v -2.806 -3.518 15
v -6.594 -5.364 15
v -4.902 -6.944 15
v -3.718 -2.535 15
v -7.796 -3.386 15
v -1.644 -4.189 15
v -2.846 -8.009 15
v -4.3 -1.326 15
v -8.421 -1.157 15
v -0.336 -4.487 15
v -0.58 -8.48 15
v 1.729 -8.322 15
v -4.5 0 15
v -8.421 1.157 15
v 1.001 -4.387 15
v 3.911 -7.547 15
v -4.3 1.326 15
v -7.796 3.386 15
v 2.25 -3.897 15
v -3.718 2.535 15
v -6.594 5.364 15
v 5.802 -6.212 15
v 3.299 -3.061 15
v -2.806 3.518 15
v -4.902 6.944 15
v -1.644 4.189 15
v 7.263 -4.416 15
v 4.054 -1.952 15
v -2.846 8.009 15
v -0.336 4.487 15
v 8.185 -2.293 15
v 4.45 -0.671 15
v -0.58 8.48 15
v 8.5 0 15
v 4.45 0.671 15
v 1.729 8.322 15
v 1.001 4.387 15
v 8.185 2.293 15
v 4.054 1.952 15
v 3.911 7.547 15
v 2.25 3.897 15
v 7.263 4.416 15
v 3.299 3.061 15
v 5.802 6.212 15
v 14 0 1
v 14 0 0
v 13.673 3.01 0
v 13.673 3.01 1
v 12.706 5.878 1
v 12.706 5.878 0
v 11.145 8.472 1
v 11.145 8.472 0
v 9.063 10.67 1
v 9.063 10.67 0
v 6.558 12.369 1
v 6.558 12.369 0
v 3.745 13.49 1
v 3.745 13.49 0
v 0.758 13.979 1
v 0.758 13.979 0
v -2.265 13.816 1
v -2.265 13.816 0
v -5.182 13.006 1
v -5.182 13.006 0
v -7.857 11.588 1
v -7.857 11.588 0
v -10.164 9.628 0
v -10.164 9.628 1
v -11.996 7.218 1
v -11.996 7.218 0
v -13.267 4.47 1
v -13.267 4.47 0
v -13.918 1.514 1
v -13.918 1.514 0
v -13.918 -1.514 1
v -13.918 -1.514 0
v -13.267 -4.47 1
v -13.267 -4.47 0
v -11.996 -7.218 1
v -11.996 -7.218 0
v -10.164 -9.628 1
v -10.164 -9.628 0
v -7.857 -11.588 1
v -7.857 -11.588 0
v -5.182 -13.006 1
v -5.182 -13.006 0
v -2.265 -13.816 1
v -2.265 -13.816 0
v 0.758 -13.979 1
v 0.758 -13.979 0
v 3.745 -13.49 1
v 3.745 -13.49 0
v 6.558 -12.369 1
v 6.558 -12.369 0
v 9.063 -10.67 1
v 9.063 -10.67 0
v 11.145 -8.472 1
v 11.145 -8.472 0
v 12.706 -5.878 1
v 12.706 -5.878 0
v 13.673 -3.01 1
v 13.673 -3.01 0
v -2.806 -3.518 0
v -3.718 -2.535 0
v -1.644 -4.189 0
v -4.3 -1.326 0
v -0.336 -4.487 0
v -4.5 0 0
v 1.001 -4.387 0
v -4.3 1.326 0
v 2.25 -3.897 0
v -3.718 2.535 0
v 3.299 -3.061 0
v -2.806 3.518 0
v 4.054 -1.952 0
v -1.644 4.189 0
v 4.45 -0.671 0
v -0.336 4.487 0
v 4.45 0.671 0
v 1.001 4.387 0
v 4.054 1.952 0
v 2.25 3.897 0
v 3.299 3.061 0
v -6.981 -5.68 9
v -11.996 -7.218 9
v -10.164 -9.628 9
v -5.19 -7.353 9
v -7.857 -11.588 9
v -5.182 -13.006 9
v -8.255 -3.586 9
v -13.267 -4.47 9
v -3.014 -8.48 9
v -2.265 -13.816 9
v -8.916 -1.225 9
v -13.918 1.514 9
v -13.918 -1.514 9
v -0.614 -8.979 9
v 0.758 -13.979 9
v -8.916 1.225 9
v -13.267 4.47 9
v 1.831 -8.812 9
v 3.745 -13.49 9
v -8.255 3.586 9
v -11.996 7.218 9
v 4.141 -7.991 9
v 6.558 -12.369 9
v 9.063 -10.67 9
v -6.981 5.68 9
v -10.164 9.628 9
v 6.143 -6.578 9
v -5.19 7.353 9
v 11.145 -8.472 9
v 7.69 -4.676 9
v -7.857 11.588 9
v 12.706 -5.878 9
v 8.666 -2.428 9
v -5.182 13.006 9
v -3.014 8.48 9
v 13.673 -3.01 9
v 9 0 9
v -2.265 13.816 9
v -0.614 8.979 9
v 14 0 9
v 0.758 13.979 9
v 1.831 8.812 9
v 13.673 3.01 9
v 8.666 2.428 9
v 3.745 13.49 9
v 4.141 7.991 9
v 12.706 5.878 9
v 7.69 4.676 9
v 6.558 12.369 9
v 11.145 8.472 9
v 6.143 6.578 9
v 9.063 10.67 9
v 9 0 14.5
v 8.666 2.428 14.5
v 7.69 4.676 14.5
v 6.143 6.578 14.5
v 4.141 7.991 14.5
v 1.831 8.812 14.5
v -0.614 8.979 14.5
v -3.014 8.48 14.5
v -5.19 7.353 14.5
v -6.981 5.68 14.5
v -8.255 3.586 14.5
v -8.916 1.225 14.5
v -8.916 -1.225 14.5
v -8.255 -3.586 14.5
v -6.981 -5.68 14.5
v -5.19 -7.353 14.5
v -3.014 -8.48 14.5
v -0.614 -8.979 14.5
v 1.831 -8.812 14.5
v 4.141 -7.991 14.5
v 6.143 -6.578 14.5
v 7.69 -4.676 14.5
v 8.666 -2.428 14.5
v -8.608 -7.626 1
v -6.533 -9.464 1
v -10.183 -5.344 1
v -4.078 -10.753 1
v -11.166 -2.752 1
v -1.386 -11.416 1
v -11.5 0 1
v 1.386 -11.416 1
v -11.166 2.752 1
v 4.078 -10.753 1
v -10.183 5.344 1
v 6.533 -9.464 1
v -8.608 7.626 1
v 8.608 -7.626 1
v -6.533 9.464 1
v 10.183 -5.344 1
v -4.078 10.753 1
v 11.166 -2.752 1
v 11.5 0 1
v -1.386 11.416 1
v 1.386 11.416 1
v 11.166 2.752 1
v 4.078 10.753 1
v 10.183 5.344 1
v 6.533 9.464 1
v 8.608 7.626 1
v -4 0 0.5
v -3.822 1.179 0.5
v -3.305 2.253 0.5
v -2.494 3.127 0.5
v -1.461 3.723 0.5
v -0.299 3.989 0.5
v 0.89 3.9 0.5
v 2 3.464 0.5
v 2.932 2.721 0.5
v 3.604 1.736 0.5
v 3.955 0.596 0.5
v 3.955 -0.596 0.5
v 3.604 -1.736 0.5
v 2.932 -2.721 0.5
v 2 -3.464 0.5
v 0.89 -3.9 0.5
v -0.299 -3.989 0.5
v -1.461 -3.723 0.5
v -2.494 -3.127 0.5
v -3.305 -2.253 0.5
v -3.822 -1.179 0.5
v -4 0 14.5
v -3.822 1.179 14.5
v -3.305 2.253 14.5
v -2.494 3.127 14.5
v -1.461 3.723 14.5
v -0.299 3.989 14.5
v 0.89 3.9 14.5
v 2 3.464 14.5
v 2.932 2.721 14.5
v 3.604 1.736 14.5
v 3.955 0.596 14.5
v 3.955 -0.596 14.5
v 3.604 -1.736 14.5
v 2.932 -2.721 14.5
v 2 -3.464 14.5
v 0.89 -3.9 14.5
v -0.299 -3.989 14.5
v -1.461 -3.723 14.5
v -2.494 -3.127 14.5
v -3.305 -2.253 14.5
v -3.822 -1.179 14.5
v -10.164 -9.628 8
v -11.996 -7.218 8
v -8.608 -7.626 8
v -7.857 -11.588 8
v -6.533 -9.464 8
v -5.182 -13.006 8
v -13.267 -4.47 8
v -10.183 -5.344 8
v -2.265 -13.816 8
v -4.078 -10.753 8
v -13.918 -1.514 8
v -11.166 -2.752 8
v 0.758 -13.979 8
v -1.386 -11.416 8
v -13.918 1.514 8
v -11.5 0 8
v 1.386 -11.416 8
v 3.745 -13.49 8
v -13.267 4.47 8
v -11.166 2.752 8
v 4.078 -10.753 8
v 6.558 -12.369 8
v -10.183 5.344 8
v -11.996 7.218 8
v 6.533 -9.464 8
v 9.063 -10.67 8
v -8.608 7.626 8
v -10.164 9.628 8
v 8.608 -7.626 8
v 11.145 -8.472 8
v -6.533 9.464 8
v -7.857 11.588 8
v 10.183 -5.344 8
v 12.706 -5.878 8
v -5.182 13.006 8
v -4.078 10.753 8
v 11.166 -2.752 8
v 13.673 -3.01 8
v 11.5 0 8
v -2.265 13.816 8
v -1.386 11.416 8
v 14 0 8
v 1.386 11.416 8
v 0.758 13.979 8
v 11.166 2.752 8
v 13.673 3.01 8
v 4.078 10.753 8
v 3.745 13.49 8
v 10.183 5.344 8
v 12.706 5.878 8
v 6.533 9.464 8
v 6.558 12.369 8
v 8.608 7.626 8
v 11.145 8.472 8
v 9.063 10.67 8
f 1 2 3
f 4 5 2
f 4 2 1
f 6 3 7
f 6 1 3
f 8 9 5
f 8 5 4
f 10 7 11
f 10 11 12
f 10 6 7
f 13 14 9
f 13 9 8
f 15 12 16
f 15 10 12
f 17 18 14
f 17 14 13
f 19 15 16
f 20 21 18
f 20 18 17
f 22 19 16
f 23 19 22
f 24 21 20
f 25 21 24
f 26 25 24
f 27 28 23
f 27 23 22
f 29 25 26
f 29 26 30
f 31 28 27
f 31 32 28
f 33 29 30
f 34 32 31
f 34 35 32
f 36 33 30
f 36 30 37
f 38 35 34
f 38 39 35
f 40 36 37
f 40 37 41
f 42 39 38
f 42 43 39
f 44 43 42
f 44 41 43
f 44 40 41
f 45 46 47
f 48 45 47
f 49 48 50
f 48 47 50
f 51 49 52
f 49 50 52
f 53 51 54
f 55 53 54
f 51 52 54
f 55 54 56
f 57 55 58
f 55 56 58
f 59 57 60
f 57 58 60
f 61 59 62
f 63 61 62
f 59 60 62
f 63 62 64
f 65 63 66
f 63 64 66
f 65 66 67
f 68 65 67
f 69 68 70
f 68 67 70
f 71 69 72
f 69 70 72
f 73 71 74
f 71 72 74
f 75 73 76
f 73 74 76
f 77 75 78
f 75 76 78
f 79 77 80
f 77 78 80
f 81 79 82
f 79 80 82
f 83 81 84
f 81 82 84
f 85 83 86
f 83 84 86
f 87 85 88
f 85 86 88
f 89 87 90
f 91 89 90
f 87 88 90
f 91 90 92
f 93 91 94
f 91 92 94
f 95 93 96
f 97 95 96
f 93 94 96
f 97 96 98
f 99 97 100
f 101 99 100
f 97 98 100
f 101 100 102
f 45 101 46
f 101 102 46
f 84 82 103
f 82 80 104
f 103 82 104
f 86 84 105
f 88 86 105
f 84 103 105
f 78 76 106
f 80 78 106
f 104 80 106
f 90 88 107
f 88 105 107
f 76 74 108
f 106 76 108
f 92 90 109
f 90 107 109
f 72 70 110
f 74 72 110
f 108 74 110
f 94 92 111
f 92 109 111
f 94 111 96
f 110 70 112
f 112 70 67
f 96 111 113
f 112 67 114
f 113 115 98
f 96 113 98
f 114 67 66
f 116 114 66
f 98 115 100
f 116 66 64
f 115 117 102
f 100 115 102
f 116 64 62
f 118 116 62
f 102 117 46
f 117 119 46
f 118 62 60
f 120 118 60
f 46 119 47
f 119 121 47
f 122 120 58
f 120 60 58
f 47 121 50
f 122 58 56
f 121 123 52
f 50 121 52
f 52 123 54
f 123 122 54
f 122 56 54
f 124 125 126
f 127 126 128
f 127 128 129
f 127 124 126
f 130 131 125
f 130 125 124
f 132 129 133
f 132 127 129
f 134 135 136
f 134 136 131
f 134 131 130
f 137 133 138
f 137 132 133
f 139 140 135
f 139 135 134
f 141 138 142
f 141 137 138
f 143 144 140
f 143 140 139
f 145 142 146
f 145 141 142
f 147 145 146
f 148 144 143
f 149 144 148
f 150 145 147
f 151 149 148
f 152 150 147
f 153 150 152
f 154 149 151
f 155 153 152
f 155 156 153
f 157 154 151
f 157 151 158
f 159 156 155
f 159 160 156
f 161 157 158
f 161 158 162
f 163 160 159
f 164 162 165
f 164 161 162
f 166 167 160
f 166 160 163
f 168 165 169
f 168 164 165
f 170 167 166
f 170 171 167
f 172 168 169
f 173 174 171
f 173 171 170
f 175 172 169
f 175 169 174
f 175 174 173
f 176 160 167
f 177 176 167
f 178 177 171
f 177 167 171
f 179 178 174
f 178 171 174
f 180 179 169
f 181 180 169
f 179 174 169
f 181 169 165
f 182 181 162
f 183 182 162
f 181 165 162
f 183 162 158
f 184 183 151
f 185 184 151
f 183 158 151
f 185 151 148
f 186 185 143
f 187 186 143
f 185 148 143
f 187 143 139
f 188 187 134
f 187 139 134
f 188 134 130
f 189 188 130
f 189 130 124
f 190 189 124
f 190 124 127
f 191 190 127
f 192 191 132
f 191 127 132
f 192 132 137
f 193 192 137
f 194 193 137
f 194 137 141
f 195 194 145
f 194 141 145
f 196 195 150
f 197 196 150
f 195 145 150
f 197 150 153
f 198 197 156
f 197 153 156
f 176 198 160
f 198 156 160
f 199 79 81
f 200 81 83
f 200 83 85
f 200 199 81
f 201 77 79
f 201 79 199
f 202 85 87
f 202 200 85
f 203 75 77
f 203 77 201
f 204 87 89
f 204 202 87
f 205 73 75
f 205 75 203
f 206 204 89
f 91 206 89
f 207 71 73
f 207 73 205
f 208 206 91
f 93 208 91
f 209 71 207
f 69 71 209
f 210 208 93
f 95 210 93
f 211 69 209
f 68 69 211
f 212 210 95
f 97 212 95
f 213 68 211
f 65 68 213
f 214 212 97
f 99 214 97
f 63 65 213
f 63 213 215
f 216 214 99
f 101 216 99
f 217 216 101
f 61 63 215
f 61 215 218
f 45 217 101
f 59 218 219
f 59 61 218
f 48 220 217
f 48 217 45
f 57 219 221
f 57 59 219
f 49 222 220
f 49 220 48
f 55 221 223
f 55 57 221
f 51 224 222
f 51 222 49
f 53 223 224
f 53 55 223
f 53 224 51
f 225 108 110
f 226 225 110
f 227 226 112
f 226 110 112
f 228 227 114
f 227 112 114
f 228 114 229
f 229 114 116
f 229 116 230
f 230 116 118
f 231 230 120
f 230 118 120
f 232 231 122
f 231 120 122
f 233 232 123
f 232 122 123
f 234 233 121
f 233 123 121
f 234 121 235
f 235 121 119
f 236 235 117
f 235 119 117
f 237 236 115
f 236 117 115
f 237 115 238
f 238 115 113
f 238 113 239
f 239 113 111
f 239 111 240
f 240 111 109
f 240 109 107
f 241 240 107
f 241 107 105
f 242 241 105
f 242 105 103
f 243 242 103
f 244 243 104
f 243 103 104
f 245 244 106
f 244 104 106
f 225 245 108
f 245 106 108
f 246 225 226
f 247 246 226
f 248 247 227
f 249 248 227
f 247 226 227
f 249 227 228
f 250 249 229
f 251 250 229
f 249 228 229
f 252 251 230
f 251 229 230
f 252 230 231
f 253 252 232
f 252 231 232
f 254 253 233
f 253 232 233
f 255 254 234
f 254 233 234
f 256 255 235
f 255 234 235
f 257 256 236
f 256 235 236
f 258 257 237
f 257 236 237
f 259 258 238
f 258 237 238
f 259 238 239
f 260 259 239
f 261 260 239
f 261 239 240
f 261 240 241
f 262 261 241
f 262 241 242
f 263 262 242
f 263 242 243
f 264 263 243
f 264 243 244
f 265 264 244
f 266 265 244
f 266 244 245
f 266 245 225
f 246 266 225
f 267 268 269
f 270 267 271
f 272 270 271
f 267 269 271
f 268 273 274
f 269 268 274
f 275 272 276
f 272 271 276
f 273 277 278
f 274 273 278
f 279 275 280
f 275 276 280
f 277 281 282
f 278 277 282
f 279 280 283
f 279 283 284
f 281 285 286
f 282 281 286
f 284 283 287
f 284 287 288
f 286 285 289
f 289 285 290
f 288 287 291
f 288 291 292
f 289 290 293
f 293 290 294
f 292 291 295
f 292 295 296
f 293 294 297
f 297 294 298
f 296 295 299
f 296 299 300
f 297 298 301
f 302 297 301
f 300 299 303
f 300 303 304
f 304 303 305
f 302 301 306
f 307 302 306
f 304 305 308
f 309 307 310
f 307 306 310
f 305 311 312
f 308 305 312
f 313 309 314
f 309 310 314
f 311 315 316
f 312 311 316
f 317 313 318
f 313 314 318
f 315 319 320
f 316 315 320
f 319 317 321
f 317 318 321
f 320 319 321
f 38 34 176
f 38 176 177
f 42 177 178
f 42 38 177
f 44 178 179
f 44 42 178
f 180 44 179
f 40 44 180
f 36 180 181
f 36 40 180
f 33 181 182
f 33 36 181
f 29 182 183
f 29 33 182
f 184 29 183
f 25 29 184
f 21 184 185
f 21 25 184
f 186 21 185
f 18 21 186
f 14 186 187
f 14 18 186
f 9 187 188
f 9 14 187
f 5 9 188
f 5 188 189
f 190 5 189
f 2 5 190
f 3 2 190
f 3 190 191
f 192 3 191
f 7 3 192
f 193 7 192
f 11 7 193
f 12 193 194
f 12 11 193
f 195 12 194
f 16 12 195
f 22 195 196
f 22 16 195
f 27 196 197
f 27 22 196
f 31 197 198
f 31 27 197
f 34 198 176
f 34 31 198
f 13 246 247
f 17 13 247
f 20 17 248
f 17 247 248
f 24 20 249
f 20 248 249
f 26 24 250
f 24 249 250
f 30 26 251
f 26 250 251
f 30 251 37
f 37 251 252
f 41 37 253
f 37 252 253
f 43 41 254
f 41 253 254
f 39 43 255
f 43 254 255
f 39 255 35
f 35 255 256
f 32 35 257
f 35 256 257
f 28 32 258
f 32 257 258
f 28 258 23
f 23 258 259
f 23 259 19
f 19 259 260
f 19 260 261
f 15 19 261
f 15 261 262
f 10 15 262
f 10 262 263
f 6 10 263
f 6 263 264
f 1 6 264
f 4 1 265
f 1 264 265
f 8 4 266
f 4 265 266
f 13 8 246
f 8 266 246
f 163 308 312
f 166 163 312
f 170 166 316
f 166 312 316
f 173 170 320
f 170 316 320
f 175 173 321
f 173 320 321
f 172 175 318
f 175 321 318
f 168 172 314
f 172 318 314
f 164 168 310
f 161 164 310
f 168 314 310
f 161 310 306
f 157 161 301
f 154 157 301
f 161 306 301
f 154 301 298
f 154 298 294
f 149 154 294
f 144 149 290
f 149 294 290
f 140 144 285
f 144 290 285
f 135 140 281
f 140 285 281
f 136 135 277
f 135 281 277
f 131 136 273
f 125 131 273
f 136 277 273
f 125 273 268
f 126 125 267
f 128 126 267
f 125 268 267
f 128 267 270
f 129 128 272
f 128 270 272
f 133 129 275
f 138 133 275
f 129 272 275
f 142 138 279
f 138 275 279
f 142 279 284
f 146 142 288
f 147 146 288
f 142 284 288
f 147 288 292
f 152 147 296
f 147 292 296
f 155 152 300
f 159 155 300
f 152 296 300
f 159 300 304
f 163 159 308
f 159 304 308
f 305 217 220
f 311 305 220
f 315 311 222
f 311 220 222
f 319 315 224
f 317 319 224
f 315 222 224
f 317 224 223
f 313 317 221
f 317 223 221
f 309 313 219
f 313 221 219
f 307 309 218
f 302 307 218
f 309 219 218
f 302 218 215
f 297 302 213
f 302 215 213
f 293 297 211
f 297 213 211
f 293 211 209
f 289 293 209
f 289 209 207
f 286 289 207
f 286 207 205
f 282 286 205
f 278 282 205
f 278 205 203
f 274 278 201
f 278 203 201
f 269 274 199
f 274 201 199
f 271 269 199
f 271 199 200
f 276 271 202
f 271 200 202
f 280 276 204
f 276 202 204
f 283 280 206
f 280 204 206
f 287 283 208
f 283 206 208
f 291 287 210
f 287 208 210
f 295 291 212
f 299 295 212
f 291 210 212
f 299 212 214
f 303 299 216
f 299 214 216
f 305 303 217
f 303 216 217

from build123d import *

# Parameters (mm, degrees)
SKETCH1_R           = 14
BOSS_EXTRUDE1_DEPTH = 1
SKETCH2_R           = 11.5
BOSS_EXTRUDE2_DEPTH = 7
SKETCH3_R           = 14
BOSS_EXTRUDE3_DEPTH = 1
SKETCH4_R           = 9
BOSS_EXTRUDE4_DEPTH = 6
SKETCH5_R           = 4
CUT_EXTRUDE1_DEPTH  = 23
CHAMFER1_SIZE       = 0.5


with BuildPart() as part:
    # Sketch1 → Boss-Extrude1 (new body)
    with BuildSketch(Plane.XY):
        Circle(SKETCH1_R)
    extrude(amount=BOSS_EXTRUDE1_DEPTH)

    # Sketch2 → Boss-Extrude2 (add)
    with BuildSketch(Plane.XY.offset(1)):
        Circle(SKETCH2_R)
    extrude(amount=BOSS_EXTRUDE2_DEPTH)

    # Sketch3 → Boss-Extrude3 (add)
    with BuildSketch(Plane.XY.offset(8)):
        Circle(SKETCH3_R)
    extrude(amount=BOSS_EXTRUDE3_DEPTH)

    # Sketch4 → Boss-Extrude4 (add)
    with BuildSketch(Plane.XY.offset(9)):
        Circle(SKETCH4_R)
    extrude(amount=BOSS_EXTRUDE4_DEPTH)

    # Sketch5 → Cut-Extrude1 (cut)
    with BuildSketch(Plane(origin=(0, 0, 0), x_dir=(-1, 0, 0), z_dir=(0, 0, -1))):
        Circle(SKETCH5_R)
    extrude(amount=-CUT_EXTRUDE1_DEPTH, mode=Mode.SUBTRACT)

    # Chamfer1
    chamfer1_edges = [part.edges().sort_by_distance(p)[0] for p in [
        (-9, 0, 15),
        (4, 0, 15),
        (4, 0, 0),
    ]]
    chamfer(chamfer1_edges, length=CHAMFER1_SIZE)


solid = part.part
